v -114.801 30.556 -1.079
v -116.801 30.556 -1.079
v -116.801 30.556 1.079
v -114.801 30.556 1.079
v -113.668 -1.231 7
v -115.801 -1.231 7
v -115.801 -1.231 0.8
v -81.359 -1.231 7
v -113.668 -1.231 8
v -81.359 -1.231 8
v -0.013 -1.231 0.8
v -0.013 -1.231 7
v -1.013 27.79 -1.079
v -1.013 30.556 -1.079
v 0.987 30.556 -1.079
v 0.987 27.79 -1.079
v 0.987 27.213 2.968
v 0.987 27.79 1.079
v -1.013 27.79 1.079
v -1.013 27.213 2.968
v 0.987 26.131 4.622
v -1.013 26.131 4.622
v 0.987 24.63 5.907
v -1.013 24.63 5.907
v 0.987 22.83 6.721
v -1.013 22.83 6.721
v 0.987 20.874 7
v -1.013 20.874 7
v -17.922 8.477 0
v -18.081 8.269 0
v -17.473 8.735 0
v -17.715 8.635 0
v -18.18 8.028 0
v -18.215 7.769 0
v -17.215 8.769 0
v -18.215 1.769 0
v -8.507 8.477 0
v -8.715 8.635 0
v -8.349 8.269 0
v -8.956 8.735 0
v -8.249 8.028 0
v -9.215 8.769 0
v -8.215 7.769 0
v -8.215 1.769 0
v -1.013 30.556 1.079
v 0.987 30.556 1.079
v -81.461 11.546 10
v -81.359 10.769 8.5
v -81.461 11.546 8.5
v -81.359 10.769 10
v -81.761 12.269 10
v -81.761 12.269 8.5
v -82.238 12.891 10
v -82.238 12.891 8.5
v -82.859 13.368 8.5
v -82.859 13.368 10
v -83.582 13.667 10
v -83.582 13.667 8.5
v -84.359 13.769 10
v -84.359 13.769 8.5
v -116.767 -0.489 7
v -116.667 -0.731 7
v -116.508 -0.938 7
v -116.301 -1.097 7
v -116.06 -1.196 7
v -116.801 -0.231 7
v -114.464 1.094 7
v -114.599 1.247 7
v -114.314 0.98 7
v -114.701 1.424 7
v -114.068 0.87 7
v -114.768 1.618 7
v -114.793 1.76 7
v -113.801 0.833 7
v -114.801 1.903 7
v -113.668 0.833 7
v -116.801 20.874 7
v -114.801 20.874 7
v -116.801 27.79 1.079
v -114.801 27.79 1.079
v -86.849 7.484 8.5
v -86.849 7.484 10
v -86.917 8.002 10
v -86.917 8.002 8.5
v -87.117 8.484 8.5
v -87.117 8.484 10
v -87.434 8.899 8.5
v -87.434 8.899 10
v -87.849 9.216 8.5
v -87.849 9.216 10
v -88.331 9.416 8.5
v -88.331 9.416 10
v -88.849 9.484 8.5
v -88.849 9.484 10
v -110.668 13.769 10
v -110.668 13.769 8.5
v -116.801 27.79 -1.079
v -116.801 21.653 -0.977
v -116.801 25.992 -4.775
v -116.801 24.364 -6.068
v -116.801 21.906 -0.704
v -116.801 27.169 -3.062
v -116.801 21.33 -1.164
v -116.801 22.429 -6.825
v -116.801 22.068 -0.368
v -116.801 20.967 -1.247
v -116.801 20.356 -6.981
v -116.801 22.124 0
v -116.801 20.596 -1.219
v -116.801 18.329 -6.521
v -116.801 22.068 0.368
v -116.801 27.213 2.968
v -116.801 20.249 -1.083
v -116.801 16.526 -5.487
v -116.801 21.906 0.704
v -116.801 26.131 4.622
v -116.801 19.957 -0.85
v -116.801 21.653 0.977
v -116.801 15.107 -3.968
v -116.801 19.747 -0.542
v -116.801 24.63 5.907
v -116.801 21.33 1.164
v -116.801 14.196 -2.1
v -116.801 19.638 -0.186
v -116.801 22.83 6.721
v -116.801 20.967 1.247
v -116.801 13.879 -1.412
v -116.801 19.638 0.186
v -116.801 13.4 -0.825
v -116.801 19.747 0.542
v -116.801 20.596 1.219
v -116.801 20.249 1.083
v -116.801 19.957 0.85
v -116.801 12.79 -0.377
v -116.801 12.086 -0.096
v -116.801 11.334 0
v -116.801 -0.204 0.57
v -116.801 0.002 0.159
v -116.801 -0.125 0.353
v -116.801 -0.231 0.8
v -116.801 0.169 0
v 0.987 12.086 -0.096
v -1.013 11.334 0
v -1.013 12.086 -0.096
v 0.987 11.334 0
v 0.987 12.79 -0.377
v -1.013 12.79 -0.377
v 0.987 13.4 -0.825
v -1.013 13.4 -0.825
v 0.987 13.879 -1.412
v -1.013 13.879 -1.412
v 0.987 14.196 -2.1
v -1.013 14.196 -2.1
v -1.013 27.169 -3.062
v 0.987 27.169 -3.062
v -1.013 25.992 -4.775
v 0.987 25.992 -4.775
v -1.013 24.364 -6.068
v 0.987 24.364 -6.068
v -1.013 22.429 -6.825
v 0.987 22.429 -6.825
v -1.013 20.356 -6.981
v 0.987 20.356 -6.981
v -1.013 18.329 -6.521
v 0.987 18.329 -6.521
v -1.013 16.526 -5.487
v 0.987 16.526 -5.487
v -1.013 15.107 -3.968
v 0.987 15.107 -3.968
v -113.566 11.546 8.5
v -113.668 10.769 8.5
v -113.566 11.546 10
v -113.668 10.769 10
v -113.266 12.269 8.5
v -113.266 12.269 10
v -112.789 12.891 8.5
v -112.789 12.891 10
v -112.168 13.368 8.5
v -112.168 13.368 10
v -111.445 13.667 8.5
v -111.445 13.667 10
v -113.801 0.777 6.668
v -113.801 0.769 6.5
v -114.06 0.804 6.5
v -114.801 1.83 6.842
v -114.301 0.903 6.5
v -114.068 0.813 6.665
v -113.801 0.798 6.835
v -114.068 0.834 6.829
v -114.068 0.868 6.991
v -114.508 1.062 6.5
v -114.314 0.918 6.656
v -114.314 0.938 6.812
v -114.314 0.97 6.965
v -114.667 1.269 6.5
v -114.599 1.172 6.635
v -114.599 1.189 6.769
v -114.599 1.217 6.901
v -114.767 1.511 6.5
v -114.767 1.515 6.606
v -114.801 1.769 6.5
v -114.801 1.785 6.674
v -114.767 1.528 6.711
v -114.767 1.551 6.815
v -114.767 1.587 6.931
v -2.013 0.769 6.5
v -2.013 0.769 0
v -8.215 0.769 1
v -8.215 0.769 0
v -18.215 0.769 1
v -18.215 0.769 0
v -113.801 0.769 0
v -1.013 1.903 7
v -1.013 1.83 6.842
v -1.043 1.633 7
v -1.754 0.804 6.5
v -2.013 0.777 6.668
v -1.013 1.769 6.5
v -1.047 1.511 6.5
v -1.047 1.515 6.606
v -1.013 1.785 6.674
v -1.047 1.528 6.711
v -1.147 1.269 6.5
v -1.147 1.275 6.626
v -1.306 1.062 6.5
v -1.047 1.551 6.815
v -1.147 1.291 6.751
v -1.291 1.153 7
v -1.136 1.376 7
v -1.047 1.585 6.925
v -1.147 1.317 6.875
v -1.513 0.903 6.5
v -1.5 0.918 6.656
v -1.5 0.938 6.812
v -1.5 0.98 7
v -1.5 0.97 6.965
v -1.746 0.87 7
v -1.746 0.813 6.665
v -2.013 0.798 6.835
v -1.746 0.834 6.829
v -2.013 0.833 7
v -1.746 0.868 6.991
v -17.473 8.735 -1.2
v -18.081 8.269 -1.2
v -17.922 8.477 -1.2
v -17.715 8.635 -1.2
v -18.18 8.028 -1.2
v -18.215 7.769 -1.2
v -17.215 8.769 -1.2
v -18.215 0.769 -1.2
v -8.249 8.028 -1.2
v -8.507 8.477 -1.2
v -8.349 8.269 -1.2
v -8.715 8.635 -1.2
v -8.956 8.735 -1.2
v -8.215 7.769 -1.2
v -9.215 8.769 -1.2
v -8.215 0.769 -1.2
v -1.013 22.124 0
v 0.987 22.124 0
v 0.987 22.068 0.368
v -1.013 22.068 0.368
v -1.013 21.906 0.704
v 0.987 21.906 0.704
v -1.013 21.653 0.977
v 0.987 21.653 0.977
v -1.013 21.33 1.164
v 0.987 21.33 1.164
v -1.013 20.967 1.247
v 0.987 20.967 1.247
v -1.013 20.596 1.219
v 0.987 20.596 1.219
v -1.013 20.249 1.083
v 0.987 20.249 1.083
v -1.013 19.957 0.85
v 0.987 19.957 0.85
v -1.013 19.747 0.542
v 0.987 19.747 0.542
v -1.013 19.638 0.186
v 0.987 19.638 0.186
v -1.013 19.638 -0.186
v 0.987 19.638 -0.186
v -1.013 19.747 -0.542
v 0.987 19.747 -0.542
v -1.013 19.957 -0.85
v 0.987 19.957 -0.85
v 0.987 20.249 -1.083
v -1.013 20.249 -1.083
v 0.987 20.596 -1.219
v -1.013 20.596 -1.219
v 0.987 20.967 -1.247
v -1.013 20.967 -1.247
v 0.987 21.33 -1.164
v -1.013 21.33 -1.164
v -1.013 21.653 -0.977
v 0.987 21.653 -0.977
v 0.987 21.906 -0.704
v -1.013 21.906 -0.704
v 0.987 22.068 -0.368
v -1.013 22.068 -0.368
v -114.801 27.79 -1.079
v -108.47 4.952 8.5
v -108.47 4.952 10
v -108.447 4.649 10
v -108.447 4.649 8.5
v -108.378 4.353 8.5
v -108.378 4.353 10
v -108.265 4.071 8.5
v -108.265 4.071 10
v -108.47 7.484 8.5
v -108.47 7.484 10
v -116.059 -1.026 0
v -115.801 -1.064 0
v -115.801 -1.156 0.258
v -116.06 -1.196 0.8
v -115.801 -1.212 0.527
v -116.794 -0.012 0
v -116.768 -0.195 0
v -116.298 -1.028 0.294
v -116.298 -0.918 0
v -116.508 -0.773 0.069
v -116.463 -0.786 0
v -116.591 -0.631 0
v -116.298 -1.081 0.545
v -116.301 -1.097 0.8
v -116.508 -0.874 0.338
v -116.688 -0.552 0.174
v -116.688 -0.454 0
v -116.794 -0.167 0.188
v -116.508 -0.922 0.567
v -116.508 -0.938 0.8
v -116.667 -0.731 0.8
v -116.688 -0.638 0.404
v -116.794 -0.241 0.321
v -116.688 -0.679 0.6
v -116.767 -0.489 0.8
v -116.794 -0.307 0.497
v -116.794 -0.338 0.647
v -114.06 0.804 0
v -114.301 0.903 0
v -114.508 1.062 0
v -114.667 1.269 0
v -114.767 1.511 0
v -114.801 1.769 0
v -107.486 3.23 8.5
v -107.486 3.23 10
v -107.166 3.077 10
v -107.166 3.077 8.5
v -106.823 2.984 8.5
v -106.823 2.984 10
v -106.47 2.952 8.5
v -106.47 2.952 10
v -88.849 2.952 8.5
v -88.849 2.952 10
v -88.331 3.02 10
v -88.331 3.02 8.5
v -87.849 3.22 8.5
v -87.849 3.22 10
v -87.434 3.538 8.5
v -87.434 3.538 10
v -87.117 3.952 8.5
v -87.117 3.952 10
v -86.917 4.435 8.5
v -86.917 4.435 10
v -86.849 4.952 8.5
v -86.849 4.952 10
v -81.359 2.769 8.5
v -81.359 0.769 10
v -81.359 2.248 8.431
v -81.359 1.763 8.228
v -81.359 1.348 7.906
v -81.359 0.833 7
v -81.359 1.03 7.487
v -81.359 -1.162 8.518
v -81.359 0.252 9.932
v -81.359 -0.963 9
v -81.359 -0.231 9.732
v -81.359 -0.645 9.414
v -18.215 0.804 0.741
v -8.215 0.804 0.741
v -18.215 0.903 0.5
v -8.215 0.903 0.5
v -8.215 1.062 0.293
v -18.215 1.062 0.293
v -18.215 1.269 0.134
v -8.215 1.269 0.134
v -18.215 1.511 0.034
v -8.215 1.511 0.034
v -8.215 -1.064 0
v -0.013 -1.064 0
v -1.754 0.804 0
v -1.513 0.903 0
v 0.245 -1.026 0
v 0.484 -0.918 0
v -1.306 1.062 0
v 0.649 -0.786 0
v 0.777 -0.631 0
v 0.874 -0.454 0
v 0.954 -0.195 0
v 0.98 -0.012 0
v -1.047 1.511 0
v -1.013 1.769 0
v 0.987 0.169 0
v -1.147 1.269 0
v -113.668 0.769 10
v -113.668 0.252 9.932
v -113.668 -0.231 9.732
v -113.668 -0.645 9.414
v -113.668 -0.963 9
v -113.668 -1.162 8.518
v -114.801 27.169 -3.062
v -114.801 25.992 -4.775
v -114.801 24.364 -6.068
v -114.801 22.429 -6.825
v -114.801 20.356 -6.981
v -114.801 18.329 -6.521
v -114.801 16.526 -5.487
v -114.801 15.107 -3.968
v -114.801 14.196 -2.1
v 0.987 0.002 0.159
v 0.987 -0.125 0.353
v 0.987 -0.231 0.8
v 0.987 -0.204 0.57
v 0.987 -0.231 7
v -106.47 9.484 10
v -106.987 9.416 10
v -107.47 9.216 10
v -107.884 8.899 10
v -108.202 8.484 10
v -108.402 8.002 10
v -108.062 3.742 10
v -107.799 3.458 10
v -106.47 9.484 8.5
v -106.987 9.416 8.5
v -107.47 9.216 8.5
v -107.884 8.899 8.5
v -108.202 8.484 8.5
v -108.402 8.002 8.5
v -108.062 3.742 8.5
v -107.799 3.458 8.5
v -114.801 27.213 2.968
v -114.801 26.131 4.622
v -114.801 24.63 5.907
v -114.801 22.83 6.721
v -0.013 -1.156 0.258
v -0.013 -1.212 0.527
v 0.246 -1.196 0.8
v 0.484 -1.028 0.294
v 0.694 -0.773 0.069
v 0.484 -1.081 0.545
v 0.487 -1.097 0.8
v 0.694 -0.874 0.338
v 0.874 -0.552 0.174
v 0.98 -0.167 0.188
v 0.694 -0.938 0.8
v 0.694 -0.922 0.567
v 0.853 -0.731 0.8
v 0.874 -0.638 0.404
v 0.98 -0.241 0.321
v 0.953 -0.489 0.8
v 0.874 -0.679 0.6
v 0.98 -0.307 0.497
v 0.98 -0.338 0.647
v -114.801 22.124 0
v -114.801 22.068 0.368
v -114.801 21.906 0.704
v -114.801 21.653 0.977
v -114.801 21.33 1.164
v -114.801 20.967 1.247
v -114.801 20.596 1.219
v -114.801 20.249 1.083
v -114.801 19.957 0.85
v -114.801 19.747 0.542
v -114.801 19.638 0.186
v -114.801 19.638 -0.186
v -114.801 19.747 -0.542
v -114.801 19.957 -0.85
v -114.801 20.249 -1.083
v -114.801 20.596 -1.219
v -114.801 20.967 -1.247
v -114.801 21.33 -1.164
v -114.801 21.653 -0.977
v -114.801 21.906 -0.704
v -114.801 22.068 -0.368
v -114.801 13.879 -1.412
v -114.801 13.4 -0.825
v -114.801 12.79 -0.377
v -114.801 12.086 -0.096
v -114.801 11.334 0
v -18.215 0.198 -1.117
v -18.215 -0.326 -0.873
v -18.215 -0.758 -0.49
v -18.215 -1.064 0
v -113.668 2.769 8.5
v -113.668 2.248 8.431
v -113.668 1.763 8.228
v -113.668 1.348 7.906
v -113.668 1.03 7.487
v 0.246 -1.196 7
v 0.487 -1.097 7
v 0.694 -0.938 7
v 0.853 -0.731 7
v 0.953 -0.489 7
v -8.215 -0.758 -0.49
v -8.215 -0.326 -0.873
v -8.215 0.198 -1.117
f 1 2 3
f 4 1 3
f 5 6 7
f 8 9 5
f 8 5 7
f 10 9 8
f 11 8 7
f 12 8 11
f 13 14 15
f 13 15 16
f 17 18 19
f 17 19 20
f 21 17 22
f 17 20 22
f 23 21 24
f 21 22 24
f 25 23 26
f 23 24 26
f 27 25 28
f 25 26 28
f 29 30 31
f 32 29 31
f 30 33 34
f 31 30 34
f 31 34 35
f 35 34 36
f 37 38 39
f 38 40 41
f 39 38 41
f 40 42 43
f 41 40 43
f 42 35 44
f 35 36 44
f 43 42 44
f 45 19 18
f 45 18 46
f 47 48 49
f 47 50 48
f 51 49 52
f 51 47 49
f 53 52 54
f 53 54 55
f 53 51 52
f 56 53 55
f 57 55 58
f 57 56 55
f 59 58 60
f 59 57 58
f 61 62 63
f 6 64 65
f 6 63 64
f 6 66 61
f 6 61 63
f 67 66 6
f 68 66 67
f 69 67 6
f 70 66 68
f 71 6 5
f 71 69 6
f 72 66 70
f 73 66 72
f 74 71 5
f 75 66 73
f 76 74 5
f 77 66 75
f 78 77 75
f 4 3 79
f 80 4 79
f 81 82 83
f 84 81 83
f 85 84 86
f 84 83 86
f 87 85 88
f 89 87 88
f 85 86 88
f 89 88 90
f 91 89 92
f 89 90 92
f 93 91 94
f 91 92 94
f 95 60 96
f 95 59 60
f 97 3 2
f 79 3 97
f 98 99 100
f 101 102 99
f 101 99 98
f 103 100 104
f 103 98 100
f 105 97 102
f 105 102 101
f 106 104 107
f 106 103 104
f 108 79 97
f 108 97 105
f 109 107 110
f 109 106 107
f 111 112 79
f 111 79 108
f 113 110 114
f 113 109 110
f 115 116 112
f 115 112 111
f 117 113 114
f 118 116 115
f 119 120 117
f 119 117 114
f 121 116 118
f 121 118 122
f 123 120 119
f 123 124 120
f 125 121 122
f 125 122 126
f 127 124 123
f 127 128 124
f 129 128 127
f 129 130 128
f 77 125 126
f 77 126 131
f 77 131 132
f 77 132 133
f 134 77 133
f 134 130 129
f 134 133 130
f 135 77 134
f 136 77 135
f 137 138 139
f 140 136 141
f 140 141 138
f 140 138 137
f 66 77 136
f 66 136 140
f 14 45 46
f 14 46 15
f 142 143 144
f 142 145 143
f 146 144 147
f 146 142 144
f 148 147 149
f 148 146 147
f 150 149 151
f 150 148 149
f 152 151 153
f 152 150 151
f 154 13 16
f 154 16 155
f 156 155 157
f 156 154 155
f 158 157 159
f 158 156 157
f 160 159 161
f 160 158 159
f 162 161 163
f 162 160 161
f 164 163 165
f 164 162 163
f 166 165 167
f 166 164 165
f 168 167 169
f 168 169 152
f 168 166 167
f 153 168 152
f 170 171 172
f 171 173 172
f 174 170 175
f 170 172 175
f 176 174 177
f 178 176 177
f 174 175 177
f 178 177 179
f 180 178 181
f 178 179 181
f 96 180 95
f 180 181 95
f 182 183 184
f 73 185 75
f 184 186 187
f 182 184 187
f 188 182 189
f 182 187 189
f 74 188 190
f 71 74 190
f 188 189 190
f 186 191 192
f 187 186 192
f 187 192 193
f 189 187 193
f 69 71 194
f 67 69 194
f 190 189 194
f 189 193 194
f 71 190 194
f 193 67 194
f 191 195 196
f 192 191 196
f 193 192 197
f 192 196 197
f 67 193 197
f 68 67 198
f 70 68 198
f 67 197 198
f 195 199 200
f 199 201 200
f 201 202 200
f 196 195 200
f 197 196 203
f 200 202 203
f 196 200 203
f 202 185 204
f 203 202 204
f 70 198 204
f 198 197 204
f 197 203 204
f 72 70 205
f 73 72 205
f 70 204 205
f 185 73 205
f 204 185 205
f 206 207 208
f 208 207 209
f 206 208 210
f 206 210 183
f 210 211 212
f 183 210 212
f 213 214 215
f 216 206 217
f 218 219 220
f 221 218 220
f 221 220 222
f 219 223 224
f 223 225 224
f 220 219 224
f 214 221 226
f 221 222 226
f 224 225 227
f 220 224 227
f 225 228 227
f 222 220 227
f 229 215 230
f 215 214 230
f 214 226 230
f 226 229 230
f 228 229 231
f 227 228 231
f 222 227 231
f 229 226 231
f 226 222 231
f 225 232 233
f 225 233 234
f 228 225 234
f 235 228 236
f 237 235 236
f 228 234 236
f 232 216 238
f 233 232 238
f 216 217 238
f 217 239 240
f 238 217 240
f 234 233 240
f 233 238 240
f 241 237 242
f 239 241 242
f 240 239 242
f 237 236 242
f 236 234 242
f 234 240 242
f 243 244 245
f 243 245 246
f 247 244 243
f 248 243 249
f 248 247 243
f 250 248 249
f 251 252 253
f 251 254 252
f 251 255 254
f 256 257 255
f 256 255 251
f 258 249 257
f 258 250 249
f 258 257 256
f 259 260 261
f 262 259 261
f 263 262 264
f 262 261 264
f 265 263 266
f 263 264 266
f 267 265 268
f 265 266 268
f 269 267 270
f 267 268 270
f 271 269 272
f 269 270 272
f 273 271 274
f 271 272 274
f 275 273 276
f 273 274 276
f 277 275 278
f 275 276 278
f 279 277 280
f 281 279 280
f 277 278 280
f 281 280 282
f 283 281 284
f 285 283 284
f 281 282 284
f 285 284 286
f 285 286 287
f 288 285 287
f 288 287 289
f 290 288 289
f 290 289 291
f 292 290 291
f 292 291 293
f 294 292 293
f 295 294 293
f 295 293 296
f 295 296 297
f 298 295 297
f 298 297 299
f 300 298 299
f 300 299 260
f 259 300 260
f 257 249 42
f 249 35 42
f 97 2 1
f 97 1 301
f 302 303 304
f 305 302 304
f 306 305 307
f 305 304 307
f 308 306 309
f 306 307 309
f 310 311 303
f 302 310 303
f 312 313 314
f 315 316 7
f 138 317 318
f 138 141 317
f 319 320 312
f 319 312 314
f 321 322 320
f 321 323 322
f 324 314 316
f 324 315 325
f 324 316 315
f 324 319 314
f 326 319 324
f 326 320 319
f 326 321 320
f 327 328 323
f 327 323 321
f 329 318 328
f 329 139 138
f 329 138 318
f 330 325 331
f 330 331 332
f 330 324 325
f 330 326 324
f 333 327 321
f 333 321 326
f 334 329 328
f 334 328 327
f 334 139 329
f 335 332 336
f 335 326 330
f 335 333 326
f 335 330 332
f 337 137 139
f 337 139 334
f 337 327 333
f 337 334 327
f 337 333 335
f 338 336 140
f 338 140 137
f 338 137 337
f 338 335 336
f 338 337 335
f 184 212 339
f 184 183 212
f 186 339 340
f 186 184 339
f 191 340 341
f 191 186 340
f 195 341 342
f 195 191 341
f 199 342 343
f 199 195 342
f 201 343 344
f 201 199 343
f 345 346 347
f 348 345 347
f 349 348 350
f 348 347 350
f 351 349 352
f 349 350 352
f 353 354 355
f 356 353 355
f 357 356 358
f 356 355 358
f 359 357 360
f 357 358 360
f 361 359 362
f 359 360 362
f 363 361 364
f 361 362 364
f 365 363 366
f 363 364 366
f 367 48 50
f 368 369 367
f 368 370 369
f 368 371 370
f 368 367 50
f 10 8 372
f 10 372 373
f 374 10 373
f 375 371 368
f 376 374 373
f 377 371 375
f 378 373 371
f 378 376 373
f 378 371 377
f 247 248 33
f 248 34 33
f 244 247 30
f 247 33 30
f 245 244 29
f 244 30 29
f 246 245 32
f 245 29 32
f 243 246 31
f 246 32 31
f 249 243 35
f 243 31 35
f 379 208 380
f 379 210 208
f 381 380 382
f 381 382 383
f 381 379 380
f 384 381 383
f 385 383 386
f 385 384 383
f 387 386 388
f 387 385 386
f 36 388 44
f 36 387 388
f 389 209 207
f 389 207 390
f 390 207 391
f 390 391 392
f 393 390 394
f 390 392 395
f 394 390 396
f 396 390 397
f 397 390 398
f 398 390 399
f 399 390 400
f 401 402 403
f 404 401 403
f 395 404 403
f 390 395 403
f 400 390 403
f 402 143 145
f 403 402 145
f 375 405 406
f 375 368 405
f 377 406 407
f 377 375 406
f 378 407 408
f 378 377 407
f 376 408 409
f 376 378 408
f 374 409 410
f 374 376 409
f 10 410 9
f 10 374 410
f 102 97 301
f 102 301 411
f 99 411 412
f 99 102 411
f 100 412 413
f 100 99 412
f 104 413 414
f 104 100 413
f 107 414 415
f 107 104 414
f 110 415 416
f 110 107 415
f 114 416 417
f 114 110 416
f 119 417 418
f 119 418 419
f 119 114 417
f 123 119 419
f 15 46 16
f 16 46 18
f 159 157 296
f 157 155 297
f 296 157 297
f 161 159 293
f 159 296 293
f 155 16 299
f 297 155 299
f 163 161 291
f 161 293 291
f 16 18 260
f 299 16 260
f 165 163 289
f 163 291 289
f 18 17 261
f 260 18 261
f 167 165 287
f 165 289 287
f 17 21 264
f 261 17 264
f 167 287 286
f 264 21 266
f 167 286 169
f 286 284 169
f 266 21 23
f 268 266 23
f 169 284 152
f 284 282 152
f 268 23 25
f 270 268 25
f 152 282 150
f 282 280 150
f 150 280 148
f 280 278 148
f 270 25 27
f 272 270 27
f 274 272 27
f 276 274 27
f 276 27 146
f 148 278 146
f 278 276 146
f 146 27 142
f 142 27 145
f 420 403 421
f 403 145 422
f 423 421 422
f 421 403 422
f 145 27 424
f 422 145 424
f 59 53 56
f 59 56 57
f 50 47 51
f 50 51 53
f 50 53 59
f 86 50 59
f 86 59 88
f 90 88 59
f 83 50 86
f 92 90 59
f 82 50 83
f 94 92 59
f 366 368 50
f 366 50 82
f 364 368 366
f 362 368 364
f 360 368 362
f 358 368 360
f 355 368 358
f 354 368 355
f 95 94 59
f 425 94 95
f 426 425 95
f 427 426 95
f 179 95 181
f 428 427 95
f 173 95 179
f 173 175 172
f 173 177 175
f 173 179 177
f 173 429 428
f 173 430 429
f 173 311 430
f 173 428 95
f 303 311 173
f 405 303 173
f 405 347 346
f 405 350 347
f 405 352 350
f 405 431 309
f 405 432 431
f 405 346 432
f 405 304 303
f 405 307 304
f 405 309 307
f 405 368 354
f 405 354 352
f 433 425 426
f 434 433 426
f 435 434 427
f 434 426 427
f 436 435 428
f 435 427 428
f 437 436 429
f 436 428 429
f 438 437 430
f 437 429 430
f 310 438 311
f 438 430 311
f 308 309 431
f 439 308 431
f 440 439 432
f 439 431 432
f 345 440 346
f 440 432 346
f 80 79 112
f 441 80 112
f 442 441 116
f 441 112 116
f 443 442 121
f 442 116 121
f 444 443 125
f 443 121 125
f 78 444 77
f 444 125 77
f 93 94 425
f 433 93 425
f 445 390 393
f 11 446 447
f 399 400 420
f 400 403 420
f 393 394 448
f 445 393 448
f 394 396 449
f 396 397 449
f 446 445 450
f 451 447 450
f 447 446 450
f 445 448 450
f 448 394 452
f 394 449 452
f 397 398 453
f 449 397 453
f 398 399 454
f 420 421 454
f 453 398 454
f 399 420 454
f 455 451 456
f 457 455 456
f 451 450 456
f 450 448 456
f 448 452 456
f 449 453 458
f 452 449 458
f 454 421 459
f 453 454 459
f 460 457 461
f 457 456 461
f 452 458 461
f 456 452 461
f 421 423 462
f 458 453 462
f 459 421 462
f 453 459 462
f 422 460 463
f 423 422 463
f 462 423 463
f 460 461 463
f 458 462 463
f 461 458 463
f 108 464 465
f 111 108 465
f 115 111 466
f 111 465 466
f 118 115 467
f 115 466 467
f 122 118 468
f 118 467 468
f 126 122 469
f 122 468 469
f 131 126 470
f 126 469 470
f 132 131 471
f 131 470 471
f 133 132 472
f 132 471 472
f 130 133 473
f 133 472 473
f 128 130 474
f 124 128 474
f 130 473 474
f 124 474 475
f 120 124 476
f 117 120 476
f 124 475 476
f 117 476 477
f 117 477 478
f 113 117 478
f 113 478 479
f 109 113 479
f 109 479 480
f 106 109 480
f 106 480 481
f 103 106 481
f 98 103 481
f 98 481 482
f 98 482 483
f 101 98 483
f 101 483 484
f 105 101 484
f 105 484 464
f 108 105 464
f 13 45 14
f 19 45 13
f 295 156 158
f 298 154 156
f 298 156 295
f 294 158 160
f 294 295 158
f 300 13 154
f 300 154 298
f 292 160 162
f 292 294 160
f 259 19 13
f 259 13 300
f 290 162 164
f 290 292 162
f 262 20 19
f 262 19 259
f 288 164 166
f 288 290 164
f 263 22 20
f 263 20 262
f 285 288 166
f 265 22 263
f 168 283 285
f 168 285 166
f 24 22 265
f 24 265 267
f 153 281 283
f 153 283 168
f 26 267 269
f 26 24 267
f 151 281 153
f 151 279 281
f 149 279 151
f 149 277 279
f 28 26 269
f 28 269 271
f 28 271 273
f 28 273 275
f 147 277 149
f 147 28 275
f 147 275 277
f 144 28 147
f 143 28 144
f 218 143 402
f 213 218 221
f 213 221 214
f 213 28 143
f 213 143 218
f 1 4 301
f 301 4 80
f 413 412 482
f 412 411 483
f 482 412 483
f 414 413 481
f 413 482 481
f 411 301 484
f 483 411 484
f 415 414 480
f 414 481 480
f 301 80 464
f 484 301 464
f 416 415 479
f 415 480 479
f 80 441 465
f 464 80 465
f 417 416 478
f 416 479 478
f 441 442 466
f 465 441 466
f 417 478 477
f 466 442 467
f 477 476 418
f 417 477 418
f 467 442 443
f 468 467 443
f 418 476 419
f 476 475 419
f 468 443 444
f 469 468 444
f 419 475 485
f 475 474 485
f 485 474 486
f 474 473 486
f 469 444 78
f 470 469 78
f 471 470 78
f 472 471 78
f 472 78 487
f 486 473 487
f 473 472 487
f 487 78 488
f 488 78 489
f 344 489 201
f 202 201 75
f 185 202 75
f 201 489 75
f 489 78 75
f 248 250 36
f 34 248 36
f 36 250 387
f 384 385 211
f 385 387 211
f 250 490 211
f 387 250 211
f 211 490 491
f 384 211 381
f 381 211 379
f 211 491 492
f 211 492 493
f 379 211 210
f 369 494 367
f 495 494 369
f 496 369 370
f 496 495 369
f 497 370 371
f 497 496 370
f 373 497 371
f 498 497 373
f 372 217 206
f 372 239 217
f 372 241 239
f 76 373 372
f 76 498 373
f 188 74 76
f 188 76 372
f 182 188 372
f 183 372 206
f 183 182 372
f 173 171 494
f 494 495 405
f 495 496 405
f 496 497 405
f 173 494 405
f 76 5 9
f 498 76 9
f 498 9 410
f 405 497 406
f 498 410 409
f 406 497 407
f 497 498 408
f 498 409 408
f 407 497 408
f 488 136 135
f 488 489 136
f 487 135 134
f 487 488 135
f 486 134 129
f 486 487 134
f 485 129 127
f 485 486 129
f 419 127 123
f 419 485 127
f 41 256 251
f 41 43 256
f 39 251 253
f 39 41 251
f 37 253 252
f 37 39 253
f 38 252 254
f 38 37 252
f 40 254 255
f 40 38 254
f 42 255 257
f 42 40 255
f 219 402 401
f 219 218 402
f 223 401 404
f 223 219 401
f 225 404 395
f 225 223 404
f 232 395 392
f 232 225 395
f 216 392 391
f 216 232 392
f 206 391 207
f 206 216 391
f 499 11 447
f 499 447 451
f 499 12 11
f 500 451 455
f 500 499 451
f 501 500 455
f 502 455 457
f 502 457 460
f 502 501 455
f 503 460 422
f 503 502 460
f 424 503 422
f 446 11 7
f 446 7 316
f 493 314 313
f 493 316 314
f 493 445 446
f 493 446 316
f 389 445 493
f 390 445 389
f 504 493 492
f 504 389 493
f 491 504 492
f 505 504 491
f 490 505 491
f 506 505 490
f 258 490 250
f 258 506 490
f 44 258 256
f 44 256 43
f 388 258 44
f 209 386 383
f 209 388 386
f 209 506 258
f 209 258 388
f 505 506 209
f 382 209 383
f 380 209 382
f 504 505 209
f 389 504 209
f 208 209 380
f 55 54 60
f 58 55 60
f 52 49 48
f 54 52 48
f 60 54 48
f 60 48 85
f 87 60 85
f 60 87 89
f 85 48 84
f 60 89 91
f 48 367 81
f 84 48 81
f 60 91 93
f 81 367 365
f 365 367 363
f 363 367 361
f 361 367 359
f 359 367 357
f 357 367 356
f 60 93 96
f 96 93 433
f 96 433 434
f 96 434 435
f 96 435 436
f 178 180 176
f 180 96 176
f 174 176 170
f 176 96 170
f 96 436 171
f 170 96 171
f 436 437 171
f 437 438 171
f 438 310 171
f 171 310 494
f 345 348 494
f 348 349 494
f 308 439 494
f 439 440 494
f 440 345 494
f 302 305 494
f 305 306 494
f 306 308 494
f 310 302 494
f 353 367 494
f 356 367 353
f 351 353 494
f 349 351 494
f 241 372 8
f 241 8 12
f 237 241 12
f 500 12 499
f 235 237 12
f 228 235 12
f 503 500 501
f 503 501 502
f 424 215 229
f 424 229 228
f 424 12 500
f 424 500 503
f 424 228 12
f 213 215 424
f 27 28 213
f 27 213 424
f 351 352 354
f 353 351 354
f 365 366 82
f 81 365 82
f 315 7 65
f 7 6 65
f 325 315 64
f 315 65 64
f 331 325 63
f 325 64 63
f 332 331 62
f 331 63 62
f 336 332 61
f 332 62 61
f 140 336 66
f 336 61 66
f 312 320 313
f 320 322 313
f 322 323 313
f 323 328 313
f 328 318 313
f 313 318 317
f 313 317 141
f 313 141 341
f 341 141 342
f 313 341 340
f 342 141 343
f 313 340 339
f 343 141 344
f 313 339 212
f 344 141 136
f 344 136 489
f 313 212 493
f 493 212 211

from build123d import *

# Parameters (mm, degrees)
F1_DEPTH  = 7
F2_R      = 7
F3_DEPTH  = 2
F4_R      = 7
F5_DEPTH  = 2
F6_W      = 32.3093086481
F6_H      = 2
F7_DEPTH  = 3
F8_W      = 32.3093086481
F8_H      = 1.5
F9_DEPTH  = 13
F11_W     = 10
F11_H     = 1.2
F12_DEPTH = 10
F13_DEPTH = 25
F14_R     = 3
F15_R     = 2
F16_R     = 1
F17_DEPTH = 117.7887811979
F18_R     = 3
F19_W     = 5.0336755812
F19_H     = 2.1570066456
F20_DEPTH = 2
F22_DEPTH = 2
F23_D     = 2.5


with BuildPart() as f1:
    # F0 (on Top) → F1 (new body)
    with BuildSketch(Plane.XY):
        Polygon((-114.8008331656, 27.8736967593), (-116.8008331656, 27.8736967593), (-116.8008331656, -1.2305311393), (0.9869479323, -1.2305311393), (0.9869479323, 27.8736967593), (-1.0130520677, 27.8736967593), (-1.0130520677, 0.7694688607), (-114.8008331656, 0.7694688607), align=None)
    extrude(amount=F1_DEPTH)

    # F2 (on face) → F3 (join)
    with BuildSketch(Plane(origin=(-116.8008331656, 0, 0), x_dir=(0, -1, 0), z_dir=(-1, 0, 0))):
        with Locations((-20.8736967593, 0)):
            Circle(F2_R)
    extrude(amount=-F3_DEPTH)

    # F4 (on face) → F5 (join)
    with BuildSketch(Plane(origin=(-1.0130520677, 0, 0), x_dir=(0, -1, 0), z_dir=(-1, 0, 0))):
        with Locations((-20.8736967593, 0)):
            Circle(F4_R)
    extrude(amount=-F5_DEPTH)

    # F6 (on face) → F7 (join)
    with BuildSketch(Plane.XY.offset(7)):
        with Locations((-97.5135117769, -0.2305311393)):
            Rectangle(F6_W, F6_H)
    extrude(amount=F7_DEPTH)

    # F8 (on face) → F9 (join)
    with BuildSketch(Plane(origin=(0, 0.7694688607, 0), x_dir=(-1, 0, 0), z_dir=(0, 1, 0))):
        with Locations((97.5135117769, 9.25)):
            Rectangle(F8_W, F8_H)
    extrude(amount=F9_DEPTH)

    # F11 (on face) → F12 (join)
    with BuildSketch(Plane.XZ.offset(1.2305311393)):
        with Locations((-13.2145643048, -0.6)):
            Rectangle(F11_W, F11_H)
    extrude(amount=-F12_DEPTH)

    # F10 (on face) → F13 (cut)
    with BuildSketch(Plane.XY.offset(10)):
        with BuildLine():
            ThreePointArc((-86.8486179709, 7.4843045808), (-87.4344044086, 8.8985181432), (-88.8486179709, 9.4843045808))
            Line((-88.8486179709, 9.4843045808), (-106.4697470069, 9.4843045808))
            ThreePointArc((-106.4697470069, 9.4843045808), (-107.8839605693, 8.8985181432), (-108.4697470069, 7.4843045808))
            Line((-108.4697470069, 7.4843045808), (-108.4697470069, 4.9521672986))
            ThreePointArc((-108.4697470069, 4.9521672986), (-108.4179393254, 4.4998989157), (-108.2652003167, 4.0710615092))
            ThreePointArc((-108.2652003167, 4.0710615092), (-107.9372939182, 3.5933788445), (-107.4862224218, 3.2297336335))
            ThreePointArc((-107.4862224218, 3.2297336335), (-106.996592653, 3.0228063513), (-106.4697470069, 2.9521672986))
            Line((-106.4697470069, 2.9521672986), (-88.8486179709, 2.9521672986))
            ThreePointArc((-88.8486179709, 2.9521672986), (-87.4344044086, 3.5379537363), (-86.8486179709, 4.9521672986))
            Line((-86.8486179709, 4.9521672986), (-86.8486179709, 7.4843045808))
        make_face()
    extrude(amount=-F13_DEPTH, mode=Mode.SUBTRACT)

    # F14
    f14_edges = [f1.edges().sort_by_distance(p)[0] for p in [
        (-113.668166, 13.769469, 9.25),
        (-81.358857, 13.769469, 9.25),
    ]]
    fillet(f14_edges, radius=F14_R)

    # F15
    f15_edges = [f1.edges().sort_by_distance(p)[0] for p in [
        (-97.513512, -1.230531, 10),
        (-97.513512, 0.769469, 8.5),
        (-13.214564, -1.230531, -1.2),
    ]]
    fillet(f15_edges, radius=F15_R)

    # F16
    f16_edges = [f1.edges().sort_by_distance(p)[0] for p in [
        (-13.214564, 0.769469, 0),
        (-1.013052, 0.769469, 3.25),
        (0.986948, -1.230531, 3.9),
        (-116.800833, -1.230531, 3.9),
        (-114.800833, 0.769469, 3.25),
        (-18.214564, 8.769469, -0.6),
        (-8.214564, 8.769469, -0.6),
        (-1.013052, 0.785409, 6.752009),
        (-114.800833, 0.785409, 6.752009),
        (-116.800833, -1.188344, 0.391381),
        (0.986948, -1.188344, 0.391381),
    ]]
    fillet(f16_edges, radius=F16_R)

    # F2 (on face) → F17 (cut, through all)
    with BuildSketch(Plane(origin=(-116.8008331656, 0, 0), x_dir=(0, -1, 0), z_dir=(-1, 0, 0))):
        with BuildLine():
            Line((-27.8736967593, 7), (-27.8736967593, 0))
            ThreePointArc((-27.8736967593, 0), (-25.8234442276, 4.9497474683), (-20.8736967593, 7))
            Line((-20.8736967593, 7), (-27.8736967593, 7))
        make_face()
    extrude(amount=-F17_DEPTH, mode=Mode.SUBTRACT)

    # F18
    f18_edges = [f1.edges().sort_by_distance(p)[0] for p in [
        (-115.800833, 13.873697, 0),
        (-0.013052, 13.873697, 0),
    ]]
    fillet(f18_edges, radius=F18_R)

    # F19 (on face) → F20 (join)
    with BuildSketch(Plane(origin=(-116.8008331656, 0, 0), x_dir=(0, -1, 0), z_dir=(-1, 0, 0))):
        with Locations((-28.0387327075, 0)):
            Rectangle(F19_W, F19_H)
    extrude(amount=-F20_DEPTH)

    # F21 (on face) → F22 (join)
    with BuildSketch(Plane(origin=(-1.0130520677, 0, 0), x_dir=(0, -1, 0), z_dir=(-1, 0, 0))):
        with BuildLine():
            Line((-27.7901142267, 1.0785033228), (-30.5555704981, 1.0785033228))
            Line((-30.5555704981, 1.0785033228), (-30.5555704981, -1.0785033228))
            Line((-30.5555704981, -1.0785033228), (-27.7901142267, -1.0785033228))
            ThreePointArc((-27.7901142267, -1.0785033228), (-27.8736967593, 0), (-27.7901142267, 1.0785033228))
        make_face()
    extrude(amount=-F22_DEPTH)

    # F23 (through all)
    with Locations(Plane(origin=(-116.8008331656, 0, 0), x_dir=(0, -1, 0), z_dir=(-1, 0, 0))):
        with Locations((-20.8736967593, 0)):
            Hole(F23_D / 2)


solid = f1.part
